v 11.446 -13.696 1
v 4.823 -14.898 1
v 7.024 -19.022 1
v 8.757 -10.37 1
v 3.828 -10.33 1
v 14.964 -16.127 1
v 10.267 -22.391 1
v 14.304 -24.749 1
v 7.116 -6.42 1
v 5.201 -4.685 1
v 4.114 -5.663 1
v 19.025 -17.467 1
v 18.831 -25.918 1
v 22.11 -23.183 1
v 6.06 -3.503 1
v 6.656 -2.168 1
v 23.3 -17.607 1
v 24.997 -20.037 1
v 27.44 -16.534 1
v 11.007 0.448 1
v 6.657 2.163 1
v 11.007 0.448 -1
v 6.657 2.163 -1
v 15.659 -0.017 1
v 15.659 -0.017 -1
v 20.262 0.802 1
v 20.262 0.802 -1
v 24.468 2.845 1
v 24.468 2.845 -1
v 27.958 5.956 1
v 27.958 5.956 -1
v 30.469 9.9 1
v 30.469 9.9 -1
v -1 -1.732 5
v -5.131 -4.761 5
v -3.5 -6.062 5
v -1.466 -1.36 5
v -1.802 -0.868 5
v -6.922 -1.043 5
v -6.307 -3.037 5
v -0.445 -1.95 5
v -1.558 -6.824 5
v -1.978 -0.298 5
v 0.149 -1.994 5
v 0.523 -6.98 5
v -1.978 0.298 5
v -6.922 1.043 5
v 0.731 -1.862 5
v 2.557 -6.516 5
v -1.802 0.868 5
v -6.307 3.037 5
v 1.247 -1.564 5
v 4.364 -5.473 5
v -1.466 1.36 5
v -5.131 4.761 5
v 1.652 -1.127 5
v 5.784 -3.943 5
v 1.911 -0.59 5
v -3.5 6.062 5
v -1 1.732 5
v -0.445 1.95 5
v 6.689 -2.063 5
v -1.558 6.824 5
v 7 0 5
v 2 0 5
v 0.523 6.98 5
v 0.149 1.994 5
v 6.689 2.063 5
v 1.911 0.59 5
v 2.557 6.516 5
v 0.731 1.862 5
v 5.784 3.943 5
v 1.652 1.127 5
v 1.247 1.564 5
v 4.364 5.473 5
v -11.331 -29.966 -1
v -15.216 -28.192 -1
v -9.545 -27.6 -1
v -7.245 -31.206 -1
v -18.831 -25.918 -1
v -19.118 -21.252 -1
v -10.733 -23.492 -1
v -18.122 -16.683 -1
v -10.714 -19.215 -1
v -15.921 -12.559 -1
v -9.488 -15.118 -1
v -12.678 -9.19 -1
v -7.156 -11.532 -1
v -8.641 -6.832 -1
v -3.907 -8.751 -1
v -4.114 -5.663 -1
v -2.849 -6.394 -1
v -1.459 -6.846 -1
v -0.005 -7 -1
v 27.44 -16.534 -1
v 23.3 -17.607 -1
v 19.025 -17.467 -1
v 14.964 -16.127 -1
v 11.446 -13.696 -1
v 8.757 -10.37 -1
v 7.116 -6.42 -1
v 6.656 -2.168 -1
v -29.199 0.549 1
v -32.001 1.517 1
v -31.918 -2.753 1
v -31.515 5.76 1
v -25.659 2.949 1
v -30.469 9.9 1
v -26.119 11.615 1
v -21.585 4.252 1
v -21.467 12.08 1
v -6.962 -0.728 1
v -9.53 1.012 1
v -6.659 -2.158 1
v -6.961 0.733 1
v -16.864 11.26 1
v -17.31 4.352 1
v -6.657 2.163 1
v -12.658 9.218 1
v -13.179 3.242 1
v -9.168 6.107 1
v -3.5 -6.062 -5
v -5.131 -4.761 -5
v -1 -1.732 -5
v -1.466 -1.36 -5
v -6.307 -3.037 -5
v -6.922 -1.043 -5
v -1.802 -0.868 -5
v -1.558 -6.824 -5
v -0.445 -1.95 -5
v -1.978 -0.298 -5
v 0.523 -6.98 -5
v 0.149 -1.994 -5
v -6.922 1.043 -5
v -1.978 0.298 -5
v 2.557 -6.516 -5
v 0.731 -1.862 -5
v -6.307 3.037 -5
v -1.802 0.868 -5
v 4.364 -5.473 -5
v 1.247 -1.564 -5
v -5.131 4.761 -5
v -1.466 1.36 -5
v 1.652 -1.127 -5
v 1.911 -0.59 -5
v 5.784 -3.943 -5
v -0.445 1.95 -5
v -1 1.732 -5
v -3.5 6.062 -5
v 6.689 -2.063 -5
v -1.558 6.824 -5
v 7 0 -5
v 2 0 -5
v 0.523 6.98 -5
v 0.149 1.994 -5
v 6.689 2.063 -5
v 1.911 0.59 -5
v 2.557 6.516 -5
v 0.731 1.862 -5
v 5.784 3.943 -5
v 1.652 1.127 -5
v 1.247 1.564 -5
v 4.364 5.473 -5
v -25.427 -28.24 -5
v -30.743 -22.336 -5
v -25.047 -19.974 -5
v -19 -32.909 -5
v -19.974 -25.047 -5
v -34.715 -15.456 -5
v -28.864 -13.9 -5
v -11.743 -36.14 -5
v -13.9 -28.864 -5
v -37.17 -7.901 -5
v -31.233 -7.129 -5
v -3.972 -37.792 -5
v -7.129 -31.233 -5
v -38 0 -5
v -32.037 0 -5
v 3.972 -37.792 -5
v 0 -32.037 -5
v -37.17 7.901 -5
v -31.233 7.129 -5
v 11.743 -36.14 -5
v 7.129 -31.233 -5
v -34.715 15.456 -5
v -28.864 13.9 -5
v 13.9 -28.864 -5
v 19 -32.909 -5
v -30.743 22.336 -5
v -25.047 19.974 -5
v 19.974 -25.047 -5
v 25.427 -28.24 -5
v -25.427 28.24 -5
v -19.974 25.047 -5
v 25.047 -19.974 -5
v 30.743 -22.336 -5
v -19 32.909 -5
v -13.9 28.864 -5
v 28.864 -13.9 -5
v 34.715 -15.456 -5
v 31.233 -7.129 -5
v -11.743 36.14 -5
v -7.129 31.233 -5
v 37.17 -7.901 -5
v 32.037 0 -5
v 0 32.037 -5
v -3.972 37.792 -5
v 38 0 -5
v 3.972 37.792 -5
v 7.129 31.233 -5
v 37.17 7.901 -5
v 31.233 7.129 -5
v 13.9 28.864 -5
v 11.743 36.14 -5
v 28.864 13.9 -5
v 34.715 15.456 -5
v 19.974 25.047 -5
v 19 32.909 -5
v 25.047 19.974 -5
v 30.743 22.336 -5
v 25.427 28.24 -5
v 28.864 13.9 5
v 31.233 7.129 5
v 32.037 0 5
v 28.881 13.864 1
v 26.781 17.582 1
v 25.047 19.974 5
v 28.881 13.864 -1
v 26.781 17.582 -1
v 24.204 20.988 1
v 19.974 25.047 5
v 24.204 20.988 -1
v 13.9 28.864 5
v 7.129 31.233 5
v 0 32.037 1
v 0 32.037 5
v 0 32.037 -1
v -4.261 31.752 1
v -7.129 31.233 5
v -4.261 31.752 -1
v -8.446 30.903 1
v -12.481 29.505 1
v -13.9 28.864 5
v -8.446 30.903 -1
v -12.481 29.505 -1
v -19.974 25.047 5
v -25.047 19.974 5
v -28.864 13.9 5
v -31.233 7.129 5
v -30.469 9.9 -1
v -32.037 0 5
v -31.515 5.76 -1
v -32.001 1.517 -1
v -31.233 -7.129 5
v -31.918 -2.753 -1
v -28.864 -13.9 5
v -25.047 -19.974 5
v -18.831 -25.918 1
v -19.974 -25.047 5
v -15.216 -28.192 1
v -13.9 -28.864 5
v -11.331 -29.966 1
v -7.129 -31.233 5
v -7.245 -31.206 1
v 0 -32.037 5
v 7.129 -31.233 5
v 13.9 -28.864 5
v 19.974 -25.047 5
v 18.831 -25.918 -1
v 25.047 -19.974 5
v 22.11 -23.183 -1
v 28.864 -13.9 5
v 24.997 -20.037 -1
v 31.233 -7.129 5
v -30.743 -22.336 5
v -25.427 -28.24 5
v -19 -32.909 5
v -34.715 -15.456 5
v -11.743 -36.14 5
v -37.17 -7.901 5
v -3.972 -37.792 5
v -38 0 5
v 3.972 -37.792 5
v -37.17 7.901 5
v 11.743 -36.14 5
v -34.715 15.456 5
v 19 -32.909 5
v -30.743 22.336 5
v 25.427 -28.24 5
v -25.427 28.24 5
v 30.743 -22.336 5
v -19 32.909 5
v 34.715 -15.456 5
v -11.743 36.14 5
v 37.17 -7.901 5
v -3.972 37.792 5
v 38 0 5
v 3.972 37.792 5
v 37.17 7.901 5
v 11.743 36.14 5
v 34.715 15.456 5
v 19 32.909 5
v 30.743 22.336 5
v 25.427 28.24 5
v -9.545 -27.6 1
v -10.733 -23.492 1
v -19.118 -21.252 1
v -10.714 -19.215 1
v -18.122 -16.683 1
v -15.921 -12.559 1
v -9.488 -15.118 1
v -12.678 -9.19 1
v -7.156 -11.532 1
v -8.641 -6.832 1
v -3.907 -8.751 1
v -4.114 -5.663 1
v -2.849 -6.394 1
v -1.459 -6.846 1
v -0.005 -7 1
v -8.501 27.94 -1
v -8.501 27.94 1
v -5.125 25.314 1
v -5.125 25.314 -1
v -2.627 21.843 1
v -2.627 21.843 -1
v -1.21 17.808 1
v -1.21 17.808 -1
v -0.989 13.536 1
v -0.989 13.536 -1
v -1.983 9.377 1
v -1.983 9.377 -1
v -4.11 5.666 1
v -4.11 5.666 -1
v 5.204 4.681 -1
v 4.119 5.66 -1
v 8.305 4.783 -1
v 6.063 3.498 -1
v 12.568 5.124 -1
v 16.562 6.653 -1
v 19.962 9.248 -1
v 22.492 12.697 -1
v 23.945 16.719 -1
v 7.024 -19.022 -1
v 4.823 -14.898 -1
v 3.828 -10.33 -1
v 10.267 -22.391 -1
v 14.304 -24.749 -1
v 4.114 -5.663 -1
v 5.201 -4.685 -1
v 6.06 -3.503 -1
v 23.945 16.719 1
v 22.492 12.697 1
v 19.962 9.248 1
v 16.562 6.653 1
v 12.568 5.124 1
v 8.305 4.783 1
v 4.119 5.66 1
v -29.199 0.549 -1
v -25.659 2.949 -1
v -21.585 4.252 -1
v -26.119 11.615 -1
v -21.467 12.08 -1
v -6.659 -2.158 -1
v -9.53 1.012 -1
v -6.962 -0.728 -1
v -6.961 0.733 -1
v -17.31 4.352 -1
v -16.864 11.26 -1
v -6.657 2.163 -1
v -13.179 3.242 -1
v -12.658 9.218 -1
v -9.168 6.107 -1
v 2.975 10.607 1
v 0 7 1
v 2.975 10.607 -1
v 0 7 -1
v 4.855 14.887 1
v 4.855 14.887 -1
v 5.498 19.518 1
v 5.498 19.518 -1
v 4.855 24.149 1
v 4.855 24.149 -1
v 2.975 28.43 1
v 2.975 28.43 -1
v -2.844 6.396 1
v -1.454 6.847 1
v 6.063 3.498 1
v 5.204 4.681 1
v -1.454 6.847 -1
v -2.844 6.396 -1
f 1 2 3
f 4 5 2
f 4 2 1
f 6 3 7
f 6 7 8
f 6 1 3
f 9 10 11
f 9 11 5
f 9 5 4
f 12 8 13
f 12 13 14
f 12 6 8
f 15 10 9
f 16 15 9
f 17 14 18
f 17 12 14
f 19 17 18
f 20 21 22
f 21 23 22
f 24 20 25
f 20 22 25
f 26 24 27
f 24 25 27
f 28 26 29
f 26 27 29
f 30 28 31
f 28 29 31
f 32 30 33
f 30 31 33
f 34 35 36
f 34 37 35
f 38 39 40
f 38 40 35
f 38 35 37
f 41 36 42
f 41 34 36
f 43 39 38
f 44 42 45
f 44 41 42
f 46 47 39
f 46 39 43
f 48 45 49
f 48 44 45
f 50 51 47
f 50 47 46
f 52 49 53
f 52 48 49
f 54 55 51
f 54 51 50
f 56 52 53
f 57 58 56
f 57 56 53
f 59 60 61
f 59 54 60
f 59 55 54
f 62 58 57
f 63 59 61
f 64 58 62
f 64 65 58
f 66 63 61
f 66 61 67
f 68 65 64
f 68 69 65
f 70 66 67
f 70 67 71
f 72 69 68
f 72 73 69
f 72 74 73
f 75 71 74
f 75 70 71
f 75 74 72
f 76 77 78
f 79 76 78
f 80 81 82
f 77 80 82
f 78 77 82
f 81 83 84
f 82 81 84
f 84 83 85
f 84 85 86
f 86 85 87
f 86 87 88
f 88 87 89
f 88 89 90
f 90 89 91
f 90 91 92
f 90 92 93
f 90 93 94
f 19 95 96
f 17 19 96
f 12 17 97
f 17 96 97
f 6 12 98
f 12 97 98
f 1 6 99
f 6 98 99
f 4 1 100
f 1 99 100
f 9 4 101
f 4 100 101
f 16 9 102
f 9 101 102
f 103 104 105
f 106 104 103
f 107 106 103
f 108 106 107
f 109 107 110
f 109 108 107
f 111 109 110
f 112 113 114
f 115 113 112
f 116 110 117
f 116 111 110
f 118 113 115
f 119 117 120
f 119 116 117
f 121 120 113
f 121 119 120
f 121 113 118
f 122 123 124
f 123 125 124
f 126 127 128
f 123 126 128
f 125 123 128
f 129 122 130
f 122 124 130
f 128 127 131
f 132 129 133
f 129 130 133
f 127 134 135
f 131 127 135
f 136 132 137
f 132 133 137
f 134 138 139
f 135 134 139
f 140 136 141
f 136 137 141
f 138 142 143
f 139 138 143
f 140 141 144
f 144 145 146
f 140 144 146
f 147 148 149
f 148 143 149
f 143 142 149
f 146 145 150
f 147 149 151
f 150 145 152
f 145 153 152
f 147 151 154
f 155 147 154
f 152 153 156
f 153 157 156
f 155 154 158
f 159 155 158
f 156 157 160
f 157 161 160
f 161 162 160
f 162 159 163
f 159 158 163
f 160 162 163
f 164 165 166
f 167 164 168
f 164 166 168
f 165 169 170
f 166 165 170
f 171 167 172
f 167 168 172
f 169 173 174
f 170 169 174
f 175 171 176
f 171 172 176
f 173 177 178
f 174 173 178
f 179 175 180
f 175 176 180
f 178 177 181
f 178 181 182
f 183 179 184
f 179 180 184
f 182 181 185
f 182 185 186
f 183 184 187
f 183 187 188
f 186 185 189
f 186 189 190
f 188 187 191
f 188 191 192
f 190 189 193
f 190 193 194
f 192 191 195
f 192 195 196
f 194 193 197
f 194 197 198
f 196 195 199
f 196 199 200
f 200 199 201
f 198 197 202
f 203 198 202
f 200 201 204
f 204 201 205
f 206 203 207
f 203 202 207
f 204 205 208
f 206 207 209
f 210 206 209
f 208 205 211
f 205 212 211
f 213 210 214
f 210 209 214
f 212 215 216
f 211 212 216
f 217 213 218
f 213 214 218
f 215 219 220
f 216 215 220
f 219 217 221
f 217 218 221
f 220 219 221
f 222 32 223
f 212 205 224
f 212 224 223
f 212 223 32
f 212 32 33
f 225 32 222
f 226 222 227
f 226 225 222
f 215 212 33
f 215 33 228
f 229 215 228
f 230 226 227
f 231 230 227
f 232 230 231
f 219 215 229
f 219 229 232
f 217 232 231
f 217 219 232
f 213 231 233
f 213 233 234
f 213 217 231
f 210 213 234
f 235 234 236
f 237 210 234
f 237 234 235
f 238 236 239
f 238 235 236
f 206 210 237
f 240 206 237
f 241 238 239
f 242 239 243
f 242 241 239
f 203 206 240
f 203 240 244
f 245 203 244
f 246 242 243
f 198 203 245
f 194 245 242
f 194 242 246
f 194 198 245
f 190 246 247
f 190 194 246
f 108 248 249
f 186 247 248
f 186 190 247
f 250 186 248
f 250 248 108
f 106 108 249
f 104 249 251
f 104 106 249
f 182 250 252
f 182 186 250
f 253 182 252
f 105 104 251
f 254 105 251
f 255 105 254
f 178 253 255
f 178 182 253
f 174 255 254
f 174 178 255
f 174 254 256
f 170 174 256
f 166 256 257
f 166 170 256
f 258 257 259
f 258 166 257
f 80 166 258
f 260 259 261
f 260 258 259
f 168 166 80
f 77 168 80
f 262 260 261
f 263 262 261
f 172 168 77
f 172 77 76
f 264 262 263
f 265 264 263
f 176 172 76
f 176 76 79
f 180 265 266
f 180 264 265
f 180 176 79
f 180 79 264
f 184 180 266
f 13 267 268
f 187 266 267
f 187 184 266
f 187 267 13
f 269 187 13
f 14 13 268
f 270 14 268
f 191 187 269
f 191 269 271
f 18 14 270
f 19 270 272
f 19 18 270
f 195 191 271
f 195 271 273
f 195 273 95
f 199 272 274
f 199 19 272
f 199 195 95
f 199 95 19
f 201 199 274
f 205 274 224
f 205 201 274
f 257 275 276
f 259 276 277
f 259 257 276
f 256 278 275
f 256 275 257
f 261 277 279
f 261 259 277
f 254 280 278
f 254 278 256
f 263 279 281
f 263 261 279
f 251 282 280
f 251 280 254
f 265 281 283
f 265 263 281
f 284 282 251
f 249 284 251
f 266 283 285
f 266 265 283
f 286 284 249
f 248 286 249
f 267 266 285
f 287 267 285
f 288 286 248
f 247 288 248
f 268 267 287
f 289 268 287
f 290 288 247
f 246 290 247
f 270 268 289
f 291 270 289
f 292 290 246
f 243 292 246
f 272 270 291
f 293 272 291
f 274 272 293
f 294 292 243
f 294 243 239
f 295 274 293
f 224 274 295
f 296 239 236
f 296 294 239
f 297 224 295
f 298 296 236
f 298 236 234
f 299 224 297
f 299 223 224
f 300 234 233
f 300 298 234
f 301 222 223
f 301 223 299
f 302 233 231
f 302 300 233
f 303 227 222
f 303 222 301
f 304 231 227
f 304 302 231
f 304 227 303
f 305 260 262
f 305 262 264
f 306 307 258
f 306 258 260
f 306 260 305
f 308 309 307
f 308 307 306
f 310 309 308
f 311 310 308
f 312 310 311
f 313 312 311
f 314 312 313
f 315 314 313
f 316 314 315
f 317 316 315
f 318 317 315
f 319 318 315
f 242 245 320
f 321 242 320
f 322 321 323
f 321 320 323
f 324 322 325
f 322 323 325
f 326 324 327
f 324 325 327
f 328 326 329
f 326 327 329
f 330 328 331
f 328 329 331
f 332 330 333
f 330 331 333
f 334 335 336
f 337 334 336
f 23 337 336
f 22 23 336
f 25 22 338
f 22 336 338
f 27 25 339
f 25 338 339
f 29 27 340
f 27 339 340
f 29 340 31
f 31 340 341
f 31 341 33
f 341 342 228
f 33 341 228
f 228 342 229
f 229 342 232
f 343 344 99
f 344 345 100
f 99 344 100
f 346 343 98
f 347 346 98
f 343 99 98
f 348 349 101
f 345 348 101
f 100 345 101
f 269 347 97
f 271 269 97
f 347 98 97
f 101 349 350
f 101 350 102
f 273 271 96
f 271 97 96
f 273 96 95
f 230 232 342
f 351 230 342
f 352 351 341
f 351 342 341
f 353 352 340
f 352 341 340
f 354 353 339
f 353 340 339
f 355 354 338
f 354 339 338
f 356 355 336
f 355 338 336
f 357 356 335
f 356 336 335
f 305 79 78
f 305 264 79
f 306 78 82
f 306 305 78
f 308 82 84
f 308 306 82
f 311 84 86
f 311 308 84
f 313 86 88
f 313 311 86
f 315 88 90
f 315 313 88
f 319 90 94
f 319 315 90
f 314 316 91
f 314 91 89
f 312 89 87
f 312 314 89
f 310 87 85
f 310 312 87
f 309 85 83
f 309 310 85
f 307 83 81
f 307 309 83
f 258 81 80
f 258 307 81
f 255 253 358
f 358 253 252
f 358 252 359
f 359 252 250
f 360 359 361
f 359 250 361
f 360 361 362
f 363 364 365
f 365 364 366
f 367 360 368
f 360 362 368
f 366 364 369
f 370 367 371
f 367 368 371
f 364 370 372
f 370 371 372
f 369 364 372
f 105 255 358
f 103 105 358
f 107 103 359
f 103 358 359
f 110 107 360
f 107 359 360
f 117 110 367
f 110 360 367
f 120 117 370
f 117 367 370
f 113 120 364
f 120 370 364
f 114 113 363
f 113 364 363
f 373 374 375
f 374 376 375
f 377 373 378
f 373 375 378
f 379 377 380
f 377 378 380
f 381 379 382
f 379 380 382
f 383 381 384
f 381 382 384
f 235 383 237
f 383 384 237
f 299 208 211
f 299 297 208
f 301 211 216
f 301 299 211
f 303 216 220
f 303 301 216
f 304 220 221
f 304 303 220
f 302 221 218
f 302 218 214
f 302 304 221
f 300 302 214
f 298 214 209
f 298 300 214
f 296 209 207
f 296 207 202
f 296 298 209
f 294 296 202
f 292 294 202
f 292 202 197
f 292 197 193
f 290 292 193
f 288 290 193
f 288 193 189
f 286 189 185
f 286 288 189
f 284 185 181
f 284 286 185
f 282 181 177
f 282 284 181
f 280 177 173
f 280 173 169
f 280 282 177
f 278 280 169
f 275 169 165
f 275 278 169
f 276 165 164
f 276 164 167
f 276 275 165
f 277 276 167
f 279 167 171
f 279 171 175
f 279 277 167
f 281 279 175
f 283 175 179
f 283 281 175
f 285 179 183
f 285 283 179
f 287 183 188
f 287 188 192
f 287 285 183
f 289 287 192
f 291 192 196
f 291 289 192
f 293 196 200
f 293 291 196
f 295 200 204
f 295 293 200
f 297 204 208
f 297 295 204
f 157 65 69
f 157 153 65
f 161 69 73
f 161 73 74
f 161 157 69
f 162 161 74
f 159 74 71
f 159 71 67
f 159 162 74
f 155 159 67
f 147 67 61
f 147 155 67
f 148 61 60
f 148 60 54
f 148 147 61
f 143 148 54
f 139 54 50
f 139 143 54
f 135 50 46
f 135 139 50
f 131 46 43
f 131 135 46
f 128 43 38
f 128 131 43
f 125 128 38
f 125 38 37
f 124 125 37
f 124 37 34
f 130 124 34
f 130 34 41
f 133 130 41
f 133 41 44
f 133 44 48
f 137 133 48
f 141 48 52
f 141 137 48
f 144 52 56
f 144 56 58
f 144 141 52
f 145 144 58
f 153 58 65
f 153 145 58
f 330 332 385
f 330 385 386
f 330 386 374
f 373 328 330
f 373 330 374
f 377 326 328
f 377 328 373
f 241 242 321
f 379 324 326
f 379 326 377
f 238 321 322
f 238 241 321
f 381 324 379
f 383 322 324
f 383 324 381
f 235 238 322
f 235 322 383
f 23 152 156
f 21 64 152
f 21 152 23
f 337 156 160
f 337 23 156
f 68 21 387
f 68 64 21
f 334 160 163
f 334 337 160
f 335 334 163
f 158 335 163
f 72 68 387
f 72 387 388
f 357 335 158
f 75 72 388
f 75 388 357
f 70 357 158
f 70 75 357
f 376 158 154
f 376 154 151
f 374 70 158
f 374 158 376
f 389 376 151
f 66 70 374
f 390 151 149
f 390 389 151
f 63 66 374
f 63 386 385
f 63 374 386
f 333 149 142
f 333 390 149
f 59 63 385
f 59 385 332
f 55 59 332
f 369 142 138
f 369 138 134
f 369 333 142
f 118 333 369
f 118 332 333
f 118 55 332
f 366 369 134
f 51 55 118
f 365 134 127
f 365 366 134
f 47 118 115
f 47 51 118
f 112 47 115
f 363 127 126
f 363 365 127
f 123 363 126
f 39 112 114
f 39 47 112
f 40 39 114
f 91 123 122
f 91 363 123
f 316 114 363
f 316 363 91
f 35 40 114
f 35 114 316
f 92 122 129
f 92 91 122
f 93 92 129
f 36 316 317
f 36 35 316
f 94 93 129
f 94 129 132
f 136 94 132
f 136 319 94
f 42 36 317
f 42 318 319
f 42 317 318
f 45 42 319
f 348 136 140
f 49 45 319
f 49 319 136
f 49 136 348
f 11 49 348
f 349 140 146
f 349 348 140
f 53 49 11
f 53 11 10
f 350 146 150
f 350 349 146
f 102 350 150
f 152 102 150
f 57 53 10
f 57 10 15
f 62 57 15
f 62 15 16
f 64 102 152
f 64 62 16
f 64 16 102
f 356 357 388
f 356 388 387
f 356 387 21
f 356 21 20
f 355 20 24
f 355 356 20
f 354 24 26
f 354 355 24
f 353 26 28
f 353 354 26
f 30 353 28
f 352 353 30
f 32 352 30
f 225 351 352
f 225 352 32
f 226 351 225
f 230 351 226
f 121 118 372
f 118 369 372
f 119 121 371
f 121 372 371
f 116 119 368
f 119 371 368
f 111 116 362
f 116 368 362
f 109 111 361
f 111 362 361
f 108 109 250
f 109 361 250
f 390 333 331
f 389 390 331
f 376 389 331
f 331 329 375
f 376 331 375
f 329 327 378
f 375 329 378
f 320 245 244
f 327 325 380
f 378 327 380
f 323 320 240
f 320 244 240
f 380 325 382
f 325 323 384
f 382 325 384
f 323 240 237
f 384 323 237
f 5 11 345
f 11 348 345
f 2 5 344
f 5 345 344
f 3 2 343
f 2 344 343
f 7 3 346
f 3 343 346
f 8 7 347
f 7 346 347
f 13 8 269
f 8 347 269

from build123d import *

# Parameters (mm, degrees)
SKETCH1_R             = 7
SKETCH1_R_2           = 2
BOSS_EXTRUDE1_DEPTH   = 5
SKETCH1_R_3           = 38
SKETCH1_R_4           = 32.036519423
BOSS_EXTRUDE1_2_DEPTH = 5
BOSS_EXTRUDE2_DEPTH   = 1


with BuildPart() as part:
    # Sketch1 → Boss-Extrude1 (new, symmetric)
    with BuildSketch(Plane.XY):
        Circle(SKETCH1_R)
        Circle(SKETCH1_R_2, mode=Mode.SUBTRACT)
    extrude(amount=BOSS_EXTRUDE1_DEPTH, both=True)



with BuildPart() as body_2:
    # Sketch1 → Boss-Extrude1 2 (new, symmetric)
    with BuildSketch(Plane.XY):
        Circle(SKETCH1_R_3)
        Circle(SKETCH1_R_4, mode=Mode.SUBTRACT)
    extrude(amount=BOSS_EXTRUDE1_2_DEPTH, both=True)


with BuildPart() as part_1:
    add(part.part)

    add(body_2.part)  # Boss-Extrude2 merges body 2
    # Sketch1<4> → Boss-Extrude2 (add, symmetric)
    with BuildSketch(Plane.XY):
        with BuildLine():
            ThreePointArc((-6.659062866, -2.157980943), (-6.999999479, 0.002700877), (-6.657395614, 2.163118961))
            ThreePointArc((-6.657395614, 2.163118961), (-16.863954631, 11.260499688), (-30.468540556, 9.899828942))
            ThreePointArc((-30.468540556, 9.899828942), (-31.828331282, 3.646354962), (-31.918045732, -2.752622999))
            ThreePointArc((-31.918045732, -2.752622999), (-19.451242112, 4.455290106), (-6.659062866, -2.157980943))
        make_face()
        with BuildLine():
            ThreePointArc((-4.11012543, 5.666292346), (-2.160550113, 6.658229736), (0, 7))
            ThreePointArc((0, 7), (5.498123031, 19.518259711), (0, 32.036519423))
            ThreePointArc((0, 32.036519423), (-6.367605621, 31.39732752), (-12.481118599, 29.505258095))
            ThreePointArc((-12.481118599, 29.505258095), (-1.773531687, 19.875990918), (-4.11012543, 5.666292346))
        make_face()
        with BuildLine():
            ThreePointArc((4.118865652, 5.659942203), (5.664706075, 4.112311404), (6.657395614, 2.163118961))
            ThreePointArc((6.657395614, 2.163118961), (20.261981539, 0.802448215), (30.468540556, 9.899828942))
            ThreePointArc((30.468540556, 9.899828942), (27.892934581, 15.758260601), (24.20429022, 20.987875349))
            ThreePointArc((24.20429022, 20.987875349), (18.355139249, 7.828747841), (4.118865652, 5.659942203))
        make_face()
        with BuildLine():
            ThreePointArc((27.440192629, -16.534037778), (13.117631611, -15.037558663), (6.655724398, -2.16825569))
            ThreePointArc((6.655724398, -2.16825569), (5.661531003, -4.116681515), (4.114496766, -5.663118961))
            ThreePointArc((4.114496766, -5.663118961), (7.024470239, -19.02231944), (18.830593651, -25.918088654))
            ThreePointArc((18.830593651, -25.918088654), (23.606387238, -21.658186865), (27.440192629, -16.534037778))
        make_face()
        with BuildLine():
            ThreePointArc((-7.245318518, -31.206472667), (-10.247997062, -17.122470203), (-0.005401754, -6.999997916))
            ThreePointArc((-0.005401754, -6.999997916), (-2.165687487, -6.656560502), (-4.114496766, -5.663118961))
            ThreePointArc((-4.114496766, -5.663118961), (-15.920620178, -12.558888174), (-18.830593651, -25.918088654))
            ThreePointArc((-18.830593651, -25.918088654), (-13.303384916, -29.143756218), (-7.245318518, -31.206472667))
        make_face()
    extrude(amount=BOSS_EXTRUDE2_DEPTH, both=True)


solid = part_1.part
